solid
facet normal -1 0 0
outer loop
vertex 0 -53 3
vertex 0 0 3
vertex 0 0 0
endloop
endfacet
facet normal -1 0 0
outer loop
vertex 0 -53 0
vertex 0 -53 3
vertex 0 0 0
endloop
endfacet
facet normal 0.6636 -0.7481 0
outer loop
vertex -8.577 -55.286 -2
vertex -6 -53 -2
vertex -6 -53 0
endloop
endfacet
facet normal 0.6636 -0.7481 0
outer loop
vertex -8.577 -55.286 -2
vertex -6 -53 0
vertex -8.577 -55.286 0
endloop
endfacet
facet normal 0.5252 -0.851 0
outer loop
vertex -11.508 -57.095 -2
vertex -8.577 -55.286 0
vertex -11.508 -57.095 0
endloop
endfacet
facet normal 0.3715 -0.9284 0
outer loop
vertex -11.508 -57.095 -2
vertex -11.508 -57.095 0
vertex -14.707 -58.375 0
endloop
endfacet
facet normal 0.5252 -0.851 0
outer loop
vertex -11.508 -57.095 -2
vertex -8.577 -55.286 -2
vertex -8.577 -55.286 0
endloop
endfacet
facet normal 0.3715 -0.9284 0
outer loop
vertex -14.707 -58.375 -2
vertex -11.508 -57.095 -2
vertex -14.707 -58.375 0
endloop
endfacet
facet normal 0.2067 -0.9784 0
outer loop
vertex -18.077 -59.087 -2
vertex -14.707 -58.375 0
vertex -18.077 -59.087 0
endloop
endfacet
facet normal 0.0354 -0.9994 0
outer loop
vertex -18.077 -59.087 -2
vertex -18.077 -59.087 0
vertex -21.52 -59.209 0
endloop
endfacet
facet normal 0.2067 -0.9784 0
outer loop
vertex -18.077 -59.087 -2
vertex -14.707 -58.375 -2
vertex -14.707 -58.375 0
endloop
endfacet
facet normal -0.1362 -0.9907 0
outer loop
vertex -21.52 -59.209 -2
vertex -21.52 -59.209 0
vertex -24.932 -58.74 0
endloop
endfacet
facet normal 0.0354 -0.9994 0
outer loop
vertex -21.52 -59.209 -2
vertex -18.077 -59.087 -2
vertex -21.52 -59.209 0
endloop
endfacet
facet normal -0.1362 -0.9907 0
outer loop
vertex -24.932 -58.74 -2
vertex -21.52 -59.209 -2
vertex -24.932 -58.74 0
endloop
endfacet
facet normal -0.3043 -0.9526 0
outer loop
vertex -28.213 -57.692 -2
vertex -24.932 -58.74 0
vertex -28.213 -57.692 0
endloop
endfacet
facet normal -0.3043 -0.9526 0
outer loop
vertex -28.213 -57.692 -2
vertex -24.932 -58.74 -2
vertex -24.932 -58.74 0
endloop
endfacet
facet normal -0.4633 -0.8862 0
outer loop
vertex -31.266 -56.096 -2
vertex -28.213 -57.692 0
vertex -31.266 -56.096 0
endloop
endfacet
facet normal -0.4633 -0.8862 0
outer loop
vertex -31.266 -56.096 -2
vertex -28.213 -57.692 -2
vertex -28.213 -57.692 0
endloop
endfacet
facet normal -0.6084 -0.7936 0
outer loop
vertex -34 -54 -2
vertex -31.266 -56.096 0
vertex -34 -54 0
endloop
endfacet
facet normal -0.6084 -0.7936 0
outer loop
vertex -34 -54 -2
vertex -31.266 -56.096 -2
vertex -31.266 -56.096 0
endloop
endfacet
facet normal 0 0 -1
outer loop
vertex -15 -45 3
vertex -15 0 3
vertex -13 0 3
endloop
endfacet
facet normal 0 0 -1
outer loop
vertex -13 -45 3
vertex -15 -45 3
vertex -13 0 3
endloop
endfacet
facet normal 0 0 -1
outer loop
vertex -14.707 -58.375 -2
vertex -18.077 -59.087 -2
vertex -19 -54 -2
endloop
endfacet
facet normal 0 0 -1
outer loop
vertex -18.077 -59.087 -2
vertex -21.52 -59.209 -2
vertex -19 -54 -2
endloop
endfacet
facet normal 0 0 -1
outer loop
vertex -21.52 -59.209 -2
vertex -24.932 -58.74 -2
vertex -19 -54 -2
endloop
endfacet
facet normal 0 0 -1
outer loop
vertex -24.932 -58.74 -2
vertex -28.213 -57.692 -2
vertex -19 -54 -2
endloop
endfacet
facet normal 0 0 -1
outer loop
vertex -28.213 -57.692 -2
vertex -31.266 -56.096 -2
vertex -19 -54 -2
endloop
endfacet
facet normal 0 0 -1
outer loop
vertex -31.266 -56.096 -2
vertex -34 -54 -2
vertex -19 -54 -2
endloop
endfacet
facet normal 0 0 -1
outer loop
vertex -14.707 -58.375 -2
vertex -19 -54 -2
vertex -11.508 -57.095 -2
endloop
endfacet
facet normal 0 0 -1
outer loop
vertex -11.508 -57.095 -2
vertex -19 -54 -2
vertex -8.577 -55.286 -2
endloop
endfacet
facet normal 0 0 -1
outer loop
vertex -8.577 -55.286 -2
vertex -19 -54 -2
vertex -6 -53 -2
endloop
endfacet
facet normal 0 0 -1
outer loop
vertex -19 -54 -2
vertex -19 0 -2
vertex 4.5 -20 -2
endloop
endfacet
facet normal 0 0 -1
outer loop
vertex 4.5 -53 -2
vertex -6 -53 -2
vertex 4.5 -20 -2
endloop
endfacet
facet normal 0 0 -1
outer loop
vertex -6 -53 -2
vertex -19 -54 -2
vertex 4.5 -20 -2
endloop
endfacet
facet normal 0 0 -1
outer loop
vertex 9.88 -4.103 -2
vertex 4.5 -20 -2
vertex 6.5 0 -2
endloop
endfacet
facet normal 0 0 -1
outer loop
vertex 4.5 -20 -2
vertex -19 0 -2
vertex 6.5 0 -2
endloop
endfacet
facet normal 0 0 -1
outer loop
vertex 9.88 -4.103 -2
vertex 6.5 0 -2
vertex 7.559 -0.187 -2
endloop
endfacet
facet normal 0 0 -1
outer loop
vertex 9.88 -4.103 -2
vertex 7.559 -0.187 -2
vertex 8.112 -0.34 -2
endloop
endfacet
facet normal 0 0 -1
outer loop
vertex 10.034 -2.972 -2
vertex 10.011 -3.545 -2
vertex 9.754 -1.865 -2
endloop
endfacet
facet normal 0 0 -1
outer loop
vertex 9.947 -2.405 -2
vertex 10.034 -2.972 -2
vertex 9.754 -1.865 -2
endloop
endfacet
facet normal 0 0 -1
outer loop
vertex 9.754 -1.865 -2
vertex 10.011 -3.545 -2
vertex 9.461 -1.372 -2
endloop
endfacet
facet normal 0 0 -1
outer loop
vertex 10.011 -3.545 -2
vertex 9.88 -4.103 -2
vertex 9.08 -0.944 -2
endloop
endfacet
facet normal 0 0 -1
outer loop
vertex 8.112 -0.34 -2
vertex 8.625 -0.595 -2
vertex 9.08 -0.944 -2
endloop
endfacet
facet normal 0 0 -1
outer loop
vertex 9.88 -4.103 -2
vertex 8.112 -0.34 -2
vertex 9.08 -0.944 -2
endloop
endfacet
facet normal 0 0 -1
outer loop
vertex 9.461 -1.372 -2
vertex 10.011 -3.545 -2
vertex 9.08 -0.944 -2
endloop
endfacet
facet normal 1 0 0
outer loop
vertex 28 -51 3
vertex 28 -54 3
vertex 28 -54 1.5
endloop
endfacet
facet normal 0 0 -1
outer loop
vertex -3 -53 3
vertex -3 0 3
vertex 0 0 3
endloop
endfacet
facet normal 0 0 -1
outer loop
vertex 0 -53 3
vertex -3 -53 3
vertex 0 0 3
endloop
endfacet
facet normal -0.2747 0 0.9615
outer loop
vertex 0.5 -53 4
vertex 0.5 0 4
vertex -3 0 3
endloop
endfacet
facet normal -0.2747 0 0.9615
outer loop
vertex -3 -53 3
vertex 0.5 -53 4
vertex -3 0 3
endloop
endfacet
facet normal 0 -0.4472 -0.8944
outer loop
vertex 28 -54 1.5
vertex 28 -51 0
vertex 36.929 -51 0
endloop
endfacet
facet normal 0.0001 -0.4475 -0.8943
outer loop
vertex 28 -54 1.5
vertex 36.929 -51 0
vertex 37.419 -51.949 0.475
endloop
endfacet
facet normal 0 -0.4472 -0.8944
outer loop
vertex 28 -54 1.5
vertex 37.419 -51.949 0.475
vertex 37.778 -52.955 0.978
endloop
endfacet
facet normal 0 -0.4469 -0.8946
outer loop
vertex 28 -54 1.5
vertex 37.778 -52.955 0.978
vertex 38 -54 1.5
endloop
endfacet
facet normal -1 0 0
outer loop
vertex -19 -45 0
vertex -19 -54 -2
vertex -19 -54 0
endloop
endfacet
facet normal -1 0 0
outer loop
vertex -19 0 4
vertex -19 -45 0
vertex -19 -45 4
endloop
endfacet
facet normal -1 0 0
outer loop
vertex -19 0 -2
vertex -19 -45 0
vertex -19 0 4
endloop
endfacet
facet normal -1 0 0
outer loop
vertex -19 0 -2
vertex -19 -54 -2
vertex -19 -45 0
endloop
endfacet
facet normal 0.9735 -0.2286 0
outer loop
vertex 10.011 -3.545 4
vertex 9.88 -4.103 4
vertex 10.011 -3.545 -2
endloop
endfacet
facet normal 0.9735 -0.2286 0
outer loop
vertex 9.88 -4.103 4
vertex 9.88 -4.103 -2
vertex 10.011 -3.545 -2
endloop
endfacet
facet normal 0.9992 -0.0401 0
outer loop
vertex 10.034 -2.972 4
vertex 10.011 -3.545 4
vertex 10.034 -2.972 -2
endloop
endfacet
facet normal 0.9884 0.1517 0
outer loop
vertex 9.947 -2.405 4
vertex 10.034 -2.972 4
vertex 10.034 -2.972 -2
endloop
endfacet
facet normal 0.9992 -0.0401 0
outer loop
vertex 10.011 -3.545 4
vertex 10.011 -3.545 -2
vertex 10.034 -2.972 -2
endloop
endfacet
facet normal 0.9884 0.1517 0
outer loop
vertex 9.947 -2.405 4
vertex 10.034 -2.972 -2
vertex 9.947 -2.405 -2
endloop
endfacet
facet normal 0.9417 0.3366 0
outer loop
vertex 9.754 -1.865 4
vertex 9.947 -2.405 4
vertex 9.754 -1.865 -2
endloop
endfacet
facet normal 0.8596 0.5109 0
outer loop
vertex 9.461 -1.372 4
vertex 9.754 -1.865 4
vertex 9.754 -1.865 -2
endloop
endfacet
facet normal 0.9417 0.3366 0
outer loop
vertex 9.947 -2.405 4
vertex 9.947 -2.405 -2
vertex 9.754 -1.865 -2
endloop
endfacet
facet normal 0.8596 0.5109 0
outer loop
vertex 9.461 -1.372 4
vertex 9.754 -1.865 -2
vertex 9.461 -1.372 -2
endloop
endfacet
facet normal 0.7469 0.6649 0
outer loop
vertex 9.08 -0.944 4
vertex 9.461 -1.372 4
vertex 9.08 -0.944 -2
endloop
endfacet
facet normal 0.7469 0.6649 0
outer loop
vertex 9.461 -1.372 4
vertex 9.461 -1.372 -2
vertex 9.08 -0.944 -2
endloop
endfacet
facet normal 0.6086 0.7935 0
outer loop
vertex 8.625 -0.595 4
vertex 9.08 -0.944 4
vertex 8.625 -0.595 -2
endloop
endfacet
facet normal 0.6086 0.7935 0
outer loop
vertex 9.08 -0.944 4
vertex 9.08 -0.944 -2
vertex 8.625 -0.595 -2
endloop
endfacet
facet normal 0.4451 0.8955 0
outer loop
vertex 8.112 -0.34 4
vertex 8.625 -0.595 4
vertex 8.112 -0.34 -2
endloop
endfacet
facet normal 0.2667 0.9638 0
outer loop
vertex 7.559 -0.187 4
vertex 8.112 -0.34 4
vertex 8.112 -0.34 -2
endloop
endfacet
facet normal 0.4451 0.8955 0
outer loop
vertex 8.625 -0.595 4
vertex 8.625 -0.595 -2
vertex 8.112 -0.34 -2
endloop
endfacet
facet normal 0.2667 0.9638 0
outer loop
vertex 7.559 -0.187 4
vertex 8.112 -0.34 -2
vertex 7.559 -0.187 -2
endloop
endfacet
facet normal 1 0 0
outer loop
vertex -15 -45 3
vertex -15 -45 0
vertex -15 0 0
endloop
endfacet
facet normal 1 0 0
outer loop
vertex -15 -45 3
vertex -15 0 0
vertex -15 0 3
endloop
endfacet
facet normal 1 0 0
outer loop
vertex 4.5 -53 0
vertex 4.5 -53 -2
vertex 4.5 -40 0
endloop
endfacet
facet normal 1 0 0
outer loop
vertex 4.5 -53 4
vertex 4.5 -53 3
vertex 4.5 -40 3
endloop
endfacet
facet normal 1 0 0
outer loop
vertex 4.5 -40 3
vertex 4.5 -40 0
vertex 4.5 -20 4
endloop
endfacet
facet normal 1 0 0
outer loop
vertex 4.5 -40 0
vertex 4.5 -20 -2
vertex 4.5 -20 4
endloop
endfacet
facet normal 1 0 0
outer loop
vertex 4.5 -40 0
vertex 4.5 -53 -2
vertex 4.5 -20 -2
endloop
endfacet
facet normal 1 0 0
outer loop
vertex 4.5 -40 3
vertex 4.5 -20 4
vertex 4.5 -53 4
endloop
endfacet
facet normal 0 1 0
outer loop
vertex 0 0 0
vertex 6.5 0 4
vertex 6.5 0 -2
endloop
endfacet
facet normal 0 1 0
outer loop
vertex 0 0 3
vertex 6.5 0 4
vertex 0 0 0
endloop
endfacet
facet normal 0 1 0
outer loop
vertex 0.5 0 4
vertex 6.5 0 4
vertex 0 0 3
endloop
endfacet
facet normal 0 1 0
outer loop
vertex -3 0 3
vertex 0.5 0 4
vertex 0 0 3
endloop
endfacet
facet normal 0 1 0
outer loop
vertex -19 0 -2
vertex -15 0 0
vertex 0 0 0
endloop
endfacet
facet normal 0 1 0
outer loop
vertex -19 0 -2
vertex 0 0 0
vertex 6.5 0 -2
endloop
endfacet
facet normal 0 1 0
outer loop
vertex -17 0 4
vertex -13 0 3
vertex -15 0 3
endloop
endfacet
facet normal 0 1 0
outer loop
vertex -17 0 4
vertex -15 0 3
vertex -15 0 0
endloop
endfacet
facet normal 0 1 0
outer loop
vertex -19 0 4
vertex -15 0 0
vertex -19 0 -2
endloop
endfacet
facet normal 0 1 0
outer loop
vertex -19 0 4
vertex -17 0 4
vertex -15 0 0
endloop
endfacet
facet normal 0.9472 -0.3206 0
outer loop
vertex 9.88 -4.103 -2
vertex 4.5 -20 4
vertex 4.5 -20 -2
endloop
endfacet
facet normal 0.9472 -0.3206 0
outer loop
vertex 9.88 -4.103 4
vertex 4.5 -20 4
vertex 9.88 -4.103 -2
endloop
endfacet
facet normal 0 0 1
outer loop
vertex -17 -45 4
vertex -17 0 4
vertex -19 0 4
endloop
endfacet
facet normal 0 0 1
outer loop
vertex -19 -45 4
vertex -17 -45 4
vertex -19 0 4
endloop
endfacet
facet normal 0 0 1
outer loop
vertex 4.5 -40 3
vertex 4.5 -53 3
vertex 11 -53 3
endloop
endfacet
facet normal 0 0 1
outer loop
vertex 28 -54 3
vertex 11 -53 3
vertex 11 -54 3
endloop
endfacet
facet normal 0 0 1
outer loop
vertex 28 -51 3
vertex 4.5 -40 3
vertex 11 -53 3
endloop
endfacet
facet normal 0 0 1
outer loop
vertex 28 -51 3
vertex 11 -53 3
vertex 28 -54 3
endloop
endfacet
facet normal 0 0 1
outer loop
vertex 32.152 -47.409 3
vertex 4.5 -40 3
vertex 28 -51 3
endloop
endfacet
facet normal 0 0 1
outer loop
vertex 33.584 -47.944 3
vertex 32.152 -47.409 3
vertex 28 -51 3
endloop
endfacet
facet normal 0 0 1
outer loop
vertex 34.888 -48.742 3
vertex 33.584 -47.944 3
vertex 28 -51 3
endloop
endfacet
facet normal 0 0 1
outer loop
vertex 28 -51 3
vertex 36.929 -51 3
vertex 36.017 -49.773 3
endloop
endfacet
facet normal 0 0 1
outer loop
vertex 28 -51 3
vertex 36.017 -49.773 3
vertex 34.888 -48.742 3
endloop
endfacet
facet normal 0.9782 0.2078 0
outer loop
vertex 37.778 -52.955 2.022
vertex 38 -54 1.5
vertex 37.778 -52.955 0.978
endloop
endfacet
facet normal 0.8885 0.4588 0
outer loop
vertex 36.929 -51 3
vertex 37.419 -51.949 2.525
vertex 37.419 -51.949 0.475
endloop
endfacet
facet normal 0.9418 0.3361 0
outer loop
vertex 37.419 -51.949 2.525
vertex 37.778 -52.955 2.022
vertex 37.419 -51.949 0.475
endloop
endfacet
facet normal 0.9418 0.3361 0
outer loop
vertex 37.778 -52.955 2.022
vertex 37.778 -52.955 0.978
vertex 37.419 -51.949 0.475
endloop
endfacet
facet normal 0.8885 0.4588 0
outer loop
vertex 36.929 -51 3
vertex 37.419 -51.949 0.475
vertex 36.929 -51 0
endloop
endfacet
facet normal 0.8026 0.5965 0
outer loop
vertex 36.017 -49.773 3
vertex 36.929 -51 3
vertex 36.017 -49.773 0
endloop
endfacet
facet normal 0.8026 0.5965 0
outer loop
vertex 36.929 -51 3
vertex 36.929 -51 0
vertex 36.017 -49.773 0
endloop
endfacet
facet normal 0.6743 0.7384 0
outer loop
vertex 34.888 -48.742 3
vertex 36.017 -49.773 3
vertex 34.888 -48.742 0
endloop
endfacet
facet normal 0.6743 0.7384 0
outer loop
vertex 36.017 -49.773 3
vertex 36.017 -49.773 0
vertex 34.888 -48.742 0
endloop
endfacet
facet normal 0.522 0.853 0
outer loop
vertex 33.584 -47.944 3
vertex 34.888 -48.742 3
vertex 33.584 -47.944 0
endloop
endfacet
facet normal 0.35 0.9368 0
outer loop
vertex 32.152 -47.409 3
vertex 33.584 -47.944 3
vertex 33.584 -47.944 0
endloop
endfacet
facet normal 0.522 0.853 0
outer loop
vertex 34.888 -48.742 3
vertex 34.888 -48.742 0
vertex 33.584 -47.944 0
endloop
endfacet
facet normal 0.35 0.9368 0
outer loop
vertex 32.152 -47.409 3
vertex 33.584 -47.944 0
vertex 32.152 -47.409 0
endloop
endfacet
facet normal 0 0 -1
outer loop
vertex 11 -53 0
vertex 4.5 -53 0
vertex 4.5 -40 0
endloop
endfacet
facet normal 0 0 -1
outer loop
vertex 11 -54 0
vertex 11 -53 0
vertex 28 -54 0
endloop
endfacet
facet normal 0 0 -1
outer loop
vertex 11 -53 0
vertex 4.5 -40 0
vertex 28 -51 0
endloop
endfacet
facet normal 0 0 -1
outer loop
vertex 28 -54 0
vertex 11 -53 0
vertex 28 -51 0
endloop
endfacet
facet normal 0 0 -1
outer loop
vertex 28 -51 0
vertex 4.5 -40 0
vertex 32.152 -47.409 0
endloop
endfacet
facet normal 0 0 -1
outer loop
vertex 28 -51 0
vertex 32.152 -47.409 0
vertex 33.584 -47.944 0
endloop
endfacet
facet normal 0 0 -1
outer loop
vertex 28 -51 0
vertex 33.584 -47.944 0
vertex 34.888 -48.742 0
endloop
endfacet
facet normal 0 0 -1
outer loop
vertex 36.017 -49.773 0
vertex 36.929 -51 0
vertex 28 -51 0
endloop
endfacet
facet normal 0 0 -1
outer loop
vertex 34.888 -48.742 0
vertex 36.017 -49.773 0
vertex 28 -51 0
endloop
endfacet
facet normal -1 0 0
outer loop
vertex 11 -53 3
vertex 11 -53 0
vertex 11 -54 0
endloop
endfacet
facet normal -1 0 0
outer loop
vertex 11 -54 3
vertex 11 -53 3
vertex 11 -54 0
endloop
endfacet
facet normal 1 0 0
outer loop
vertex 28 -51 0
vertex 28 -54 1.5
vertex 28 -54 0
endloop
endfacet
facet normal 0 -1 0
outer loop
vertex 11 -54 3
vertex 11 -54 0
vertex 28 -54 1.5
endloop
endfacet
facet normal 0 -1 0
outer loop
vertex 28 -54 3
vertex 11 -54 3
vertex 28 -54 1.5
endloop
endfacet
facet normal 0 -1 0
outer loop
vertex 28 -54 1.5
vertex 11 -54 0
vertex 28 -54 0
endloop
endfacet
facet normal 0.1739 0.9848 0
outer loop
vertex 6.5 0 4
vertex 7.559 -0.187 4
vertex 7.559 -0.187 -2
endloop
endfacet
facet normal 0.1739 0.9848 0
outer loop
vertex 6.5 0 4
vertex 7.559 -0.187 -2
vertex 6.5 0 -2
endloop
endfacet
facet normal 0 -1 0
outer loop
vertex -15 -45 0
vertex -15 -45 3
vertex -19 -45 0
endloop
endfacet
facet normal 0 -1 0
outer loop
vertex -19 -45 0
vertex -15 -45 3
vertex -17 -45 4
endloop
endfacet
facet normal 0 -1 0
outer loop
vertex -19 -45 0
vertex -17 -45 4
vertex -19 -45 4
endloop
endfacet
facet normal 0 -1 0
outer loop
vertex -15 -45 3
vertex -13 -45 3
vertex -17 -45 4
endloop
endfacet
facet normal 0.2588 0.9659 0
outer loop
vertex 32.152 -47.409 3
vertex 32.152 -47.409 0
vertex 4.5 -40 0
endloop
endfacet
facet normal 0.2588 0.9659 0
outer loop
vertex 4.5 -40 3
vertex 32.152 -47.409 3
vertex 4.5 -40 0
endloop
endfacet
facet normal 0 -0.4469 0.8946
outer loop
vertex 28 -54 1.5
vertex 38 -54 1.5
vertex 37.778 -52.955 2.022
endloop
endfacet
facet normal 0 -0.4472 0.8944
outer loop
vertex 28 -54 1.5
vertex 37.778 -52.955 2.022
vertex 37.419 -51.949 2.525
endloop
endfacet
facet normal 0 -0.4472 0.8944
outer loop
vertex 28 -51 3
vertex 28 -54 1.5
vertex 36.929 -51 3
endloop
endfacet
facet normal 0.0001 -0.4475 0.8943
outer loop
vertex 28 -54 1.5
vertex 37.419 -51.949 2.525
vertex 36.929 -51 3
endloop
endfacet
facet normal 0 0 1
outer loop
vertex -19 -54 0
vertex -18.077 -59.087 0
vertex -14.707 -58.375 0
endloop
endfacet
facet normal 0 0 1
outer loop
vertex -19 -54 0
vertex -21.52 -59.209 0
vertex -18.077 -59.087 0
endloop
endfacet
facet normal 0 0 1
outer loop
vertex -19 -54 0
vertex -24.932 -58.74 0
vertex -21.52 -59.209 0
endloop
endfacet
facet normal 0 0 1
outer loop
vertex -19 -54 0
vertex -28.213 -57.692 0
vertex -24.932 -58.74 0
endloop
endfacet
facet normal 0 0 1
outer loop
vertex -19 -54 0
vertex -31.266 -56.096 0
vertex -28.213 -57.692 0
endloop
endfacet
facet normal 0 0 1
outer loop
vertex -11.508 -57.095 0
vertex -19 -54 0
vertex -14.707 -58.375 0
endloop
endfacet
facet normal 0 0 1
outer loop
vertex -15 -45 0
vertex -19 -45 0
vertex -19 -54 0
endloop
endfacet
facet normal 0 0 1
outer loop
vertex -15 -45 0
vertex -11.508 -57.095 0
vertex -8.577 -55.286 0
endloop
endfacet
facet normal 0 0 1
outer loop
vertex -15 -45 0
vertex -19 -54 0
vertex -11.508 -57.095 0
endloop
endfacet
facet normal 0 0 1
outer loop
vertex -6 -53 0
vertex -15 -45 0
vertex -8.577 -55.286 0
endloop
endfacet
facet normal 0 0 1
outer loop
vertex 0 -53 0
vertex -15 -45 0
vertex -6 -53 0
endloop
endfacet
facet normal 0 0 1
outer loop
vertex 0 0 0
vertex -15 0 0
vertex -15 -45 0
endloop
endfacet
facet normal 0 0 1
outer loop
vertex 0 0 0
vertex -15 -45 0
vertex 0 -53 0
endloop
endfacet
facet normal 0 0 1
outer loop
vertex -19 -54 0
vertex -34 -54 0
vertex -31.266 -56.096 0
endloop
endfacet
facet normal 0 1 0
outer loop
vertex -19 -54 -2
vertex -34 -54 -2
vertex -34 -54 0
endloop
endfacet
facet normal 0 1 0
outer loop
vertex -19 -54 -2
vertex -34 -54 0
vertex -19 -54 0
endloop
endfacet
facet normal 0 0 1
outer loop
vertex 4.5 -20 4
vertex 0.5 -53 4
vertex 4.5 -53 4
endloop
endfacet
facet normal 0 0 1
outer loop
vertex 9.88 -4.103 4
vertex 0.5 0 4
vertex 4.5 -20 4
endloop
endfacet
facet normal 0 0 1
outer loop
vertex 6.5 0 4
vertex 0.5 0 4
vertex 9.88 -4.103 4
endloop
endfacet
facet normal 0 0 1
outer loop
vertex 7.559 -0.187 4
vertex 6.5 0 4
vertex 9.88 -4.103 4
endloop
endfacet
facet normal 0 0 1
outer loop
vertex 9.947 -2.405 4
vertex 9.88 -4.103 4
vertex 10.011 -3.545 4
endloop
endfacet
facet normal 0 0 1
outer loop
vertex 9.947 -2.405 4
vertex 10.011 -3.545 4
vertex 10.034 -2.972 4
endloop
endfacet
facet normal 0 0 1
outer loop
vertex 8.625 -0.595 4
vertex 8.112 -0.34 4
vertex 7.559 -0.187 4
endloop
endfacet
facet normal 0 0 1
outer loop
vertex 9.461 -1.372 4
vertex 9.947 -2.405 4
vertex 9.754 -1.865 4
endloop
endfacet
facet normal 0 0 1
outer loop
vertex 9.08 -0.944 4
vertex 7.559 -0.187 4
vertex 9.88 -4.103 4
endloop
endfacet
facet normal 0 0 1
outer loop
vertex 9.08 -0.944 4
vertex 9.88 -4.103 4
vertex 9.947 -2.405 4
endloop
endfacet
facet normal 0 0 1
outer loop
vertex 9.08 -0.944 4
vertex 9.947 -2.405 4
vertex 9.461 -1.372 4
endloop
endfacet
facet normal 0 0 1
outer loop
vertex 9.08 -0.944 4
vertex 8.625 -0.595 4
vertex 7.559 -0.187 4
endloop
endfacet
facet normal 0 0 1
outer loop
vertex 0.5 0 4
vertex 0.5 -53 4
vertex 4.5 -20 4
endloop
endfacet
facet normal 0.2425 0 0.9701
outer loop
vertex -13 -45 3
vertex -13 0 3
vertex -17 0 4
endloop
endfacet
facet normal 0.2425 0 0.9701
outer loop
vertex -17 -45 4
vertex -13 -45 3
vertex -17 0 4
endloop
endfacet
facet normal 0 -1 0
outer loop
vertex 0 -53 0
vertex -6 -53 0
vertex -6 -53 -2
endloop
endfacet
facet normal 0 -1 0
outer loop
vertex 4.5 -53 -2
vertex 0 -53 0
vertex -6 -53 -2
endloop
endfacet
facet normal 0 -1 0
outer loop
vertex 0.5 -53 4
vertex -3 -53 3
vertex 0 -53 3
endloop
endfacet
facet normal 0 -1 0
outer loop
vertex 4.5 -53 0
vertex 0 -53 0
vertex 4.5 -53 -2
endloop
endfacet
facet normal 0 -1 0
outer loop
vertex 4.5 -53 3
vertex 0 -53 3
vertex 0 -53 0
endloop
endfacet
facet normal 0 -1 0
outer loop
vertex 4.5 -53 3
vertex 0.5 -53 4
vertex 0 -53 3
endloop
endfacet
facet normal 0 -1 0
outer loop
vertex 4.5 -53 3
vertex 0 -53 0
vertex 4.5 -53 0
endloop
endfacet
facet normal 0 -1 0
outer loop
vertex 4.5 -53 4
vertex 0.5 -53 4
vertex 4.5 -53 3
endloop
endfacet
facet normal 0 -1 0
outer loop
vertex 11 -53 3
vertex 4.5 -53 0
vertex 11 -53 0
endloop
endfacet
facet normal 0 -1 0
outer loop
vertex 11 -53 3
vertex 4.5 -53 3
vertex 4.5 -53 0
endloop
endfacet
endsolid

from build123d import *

# Parameters (mm, degrees)
F1_DEPTH  = 53
F3_DEPTH  = 3
F6_DEPTH  = 10
F8_DEPTH  = 2
F9_W      = 4
F9_H      = 8
F9_W_2    = 2
F10_DEPTH = 4
F12_DEPTH = 6
F13_R     = 3


with BuildPart() as f1:
    # F0 (on Front) → F1 (new body)
    with BuildSketch(Plane.XZ):
        Polygon((0, 3), (0, 0), (-15, 0), (-15, 3), (-13, 3), (-17, 4), (-19, 4), (-19, -2), (4.5, -2), (4.5, 4), (0.5, 4), (-3, 3), align=None)
    extrude(amount=F1_DEPTH)

    # F2 (on Top) → F3 (join)
    with BuildSketch(Plane.XY):
        with BuildLine():
            Line((32.151714, -47.409254), (4.5, -40))
            Line((4.5, -40), (4.5, -53))
            Line((4.5, -53), (11, -53))
            Line((11, -53), (11, -54))
            Line((11, -54), (38, -54))
            ThreePointArc((38, -54), (36.065012, -49.826902), (32.151714, -47.409254))
        make_face()
    extrude(amount=F3_DEPTH)

    # F5 (on offset) → F6 (cut)
    with BuildSketch(Plane.YZ.offset(38)):
        Polygon((-59, 3), (-59, 0), (-51, 0), (-54, 1.5), (-51, 3), align=None)
    extrude(amount=-F6_DEPTH, mode=Mode.SUBTRACT)

    # F7 (on face) → F8 (join)
    with BuildSketch(Plane(origin=(0, 0, -2), x_dir=(1, 0, 0), z_dir=(0, 0, -1))):
        with BuildLine():
            Line((-19, 54), (-19, 53))
            Line((-19, 53), (-6, 53))
            ThreePointArc((-6, 53), (-19.795634, 59.222249), (-34, 54))
            Line((-34, 54), (-19, 54))
        make_face()
    extrude(amount=-F8_DEPTH)

    # F9 (on face) → F10 (cut)
    with BuildSketch(Plane.XY.offset(4)):
        with Locations((-15, -49)):
            Rectangle(F9_W, F9_H)
        with Locations((-18, -49)):
            Rectangle(F9_W_2, F9_H)
    extrude(amount=-F10_DEPTH, mode=Mode.SUBTRACT)

    # F11 (on face) → F12 (join)
    with BuildSketch(Plane.XY.offset(4)):
        Polygon((4.5, 0), (4.5, -20), (11, -0.793471), (6.5, 0), align=None)
    extrude(amount=-F12_DEPTH)

    # F13
    f13_edges = [f1.edges().sort_by_distance(p)[0] for p in [
        (11, -0.793471, 1),
    ]]
    fillet(f13_edges, radius=F13_R)


solid = f1.part
